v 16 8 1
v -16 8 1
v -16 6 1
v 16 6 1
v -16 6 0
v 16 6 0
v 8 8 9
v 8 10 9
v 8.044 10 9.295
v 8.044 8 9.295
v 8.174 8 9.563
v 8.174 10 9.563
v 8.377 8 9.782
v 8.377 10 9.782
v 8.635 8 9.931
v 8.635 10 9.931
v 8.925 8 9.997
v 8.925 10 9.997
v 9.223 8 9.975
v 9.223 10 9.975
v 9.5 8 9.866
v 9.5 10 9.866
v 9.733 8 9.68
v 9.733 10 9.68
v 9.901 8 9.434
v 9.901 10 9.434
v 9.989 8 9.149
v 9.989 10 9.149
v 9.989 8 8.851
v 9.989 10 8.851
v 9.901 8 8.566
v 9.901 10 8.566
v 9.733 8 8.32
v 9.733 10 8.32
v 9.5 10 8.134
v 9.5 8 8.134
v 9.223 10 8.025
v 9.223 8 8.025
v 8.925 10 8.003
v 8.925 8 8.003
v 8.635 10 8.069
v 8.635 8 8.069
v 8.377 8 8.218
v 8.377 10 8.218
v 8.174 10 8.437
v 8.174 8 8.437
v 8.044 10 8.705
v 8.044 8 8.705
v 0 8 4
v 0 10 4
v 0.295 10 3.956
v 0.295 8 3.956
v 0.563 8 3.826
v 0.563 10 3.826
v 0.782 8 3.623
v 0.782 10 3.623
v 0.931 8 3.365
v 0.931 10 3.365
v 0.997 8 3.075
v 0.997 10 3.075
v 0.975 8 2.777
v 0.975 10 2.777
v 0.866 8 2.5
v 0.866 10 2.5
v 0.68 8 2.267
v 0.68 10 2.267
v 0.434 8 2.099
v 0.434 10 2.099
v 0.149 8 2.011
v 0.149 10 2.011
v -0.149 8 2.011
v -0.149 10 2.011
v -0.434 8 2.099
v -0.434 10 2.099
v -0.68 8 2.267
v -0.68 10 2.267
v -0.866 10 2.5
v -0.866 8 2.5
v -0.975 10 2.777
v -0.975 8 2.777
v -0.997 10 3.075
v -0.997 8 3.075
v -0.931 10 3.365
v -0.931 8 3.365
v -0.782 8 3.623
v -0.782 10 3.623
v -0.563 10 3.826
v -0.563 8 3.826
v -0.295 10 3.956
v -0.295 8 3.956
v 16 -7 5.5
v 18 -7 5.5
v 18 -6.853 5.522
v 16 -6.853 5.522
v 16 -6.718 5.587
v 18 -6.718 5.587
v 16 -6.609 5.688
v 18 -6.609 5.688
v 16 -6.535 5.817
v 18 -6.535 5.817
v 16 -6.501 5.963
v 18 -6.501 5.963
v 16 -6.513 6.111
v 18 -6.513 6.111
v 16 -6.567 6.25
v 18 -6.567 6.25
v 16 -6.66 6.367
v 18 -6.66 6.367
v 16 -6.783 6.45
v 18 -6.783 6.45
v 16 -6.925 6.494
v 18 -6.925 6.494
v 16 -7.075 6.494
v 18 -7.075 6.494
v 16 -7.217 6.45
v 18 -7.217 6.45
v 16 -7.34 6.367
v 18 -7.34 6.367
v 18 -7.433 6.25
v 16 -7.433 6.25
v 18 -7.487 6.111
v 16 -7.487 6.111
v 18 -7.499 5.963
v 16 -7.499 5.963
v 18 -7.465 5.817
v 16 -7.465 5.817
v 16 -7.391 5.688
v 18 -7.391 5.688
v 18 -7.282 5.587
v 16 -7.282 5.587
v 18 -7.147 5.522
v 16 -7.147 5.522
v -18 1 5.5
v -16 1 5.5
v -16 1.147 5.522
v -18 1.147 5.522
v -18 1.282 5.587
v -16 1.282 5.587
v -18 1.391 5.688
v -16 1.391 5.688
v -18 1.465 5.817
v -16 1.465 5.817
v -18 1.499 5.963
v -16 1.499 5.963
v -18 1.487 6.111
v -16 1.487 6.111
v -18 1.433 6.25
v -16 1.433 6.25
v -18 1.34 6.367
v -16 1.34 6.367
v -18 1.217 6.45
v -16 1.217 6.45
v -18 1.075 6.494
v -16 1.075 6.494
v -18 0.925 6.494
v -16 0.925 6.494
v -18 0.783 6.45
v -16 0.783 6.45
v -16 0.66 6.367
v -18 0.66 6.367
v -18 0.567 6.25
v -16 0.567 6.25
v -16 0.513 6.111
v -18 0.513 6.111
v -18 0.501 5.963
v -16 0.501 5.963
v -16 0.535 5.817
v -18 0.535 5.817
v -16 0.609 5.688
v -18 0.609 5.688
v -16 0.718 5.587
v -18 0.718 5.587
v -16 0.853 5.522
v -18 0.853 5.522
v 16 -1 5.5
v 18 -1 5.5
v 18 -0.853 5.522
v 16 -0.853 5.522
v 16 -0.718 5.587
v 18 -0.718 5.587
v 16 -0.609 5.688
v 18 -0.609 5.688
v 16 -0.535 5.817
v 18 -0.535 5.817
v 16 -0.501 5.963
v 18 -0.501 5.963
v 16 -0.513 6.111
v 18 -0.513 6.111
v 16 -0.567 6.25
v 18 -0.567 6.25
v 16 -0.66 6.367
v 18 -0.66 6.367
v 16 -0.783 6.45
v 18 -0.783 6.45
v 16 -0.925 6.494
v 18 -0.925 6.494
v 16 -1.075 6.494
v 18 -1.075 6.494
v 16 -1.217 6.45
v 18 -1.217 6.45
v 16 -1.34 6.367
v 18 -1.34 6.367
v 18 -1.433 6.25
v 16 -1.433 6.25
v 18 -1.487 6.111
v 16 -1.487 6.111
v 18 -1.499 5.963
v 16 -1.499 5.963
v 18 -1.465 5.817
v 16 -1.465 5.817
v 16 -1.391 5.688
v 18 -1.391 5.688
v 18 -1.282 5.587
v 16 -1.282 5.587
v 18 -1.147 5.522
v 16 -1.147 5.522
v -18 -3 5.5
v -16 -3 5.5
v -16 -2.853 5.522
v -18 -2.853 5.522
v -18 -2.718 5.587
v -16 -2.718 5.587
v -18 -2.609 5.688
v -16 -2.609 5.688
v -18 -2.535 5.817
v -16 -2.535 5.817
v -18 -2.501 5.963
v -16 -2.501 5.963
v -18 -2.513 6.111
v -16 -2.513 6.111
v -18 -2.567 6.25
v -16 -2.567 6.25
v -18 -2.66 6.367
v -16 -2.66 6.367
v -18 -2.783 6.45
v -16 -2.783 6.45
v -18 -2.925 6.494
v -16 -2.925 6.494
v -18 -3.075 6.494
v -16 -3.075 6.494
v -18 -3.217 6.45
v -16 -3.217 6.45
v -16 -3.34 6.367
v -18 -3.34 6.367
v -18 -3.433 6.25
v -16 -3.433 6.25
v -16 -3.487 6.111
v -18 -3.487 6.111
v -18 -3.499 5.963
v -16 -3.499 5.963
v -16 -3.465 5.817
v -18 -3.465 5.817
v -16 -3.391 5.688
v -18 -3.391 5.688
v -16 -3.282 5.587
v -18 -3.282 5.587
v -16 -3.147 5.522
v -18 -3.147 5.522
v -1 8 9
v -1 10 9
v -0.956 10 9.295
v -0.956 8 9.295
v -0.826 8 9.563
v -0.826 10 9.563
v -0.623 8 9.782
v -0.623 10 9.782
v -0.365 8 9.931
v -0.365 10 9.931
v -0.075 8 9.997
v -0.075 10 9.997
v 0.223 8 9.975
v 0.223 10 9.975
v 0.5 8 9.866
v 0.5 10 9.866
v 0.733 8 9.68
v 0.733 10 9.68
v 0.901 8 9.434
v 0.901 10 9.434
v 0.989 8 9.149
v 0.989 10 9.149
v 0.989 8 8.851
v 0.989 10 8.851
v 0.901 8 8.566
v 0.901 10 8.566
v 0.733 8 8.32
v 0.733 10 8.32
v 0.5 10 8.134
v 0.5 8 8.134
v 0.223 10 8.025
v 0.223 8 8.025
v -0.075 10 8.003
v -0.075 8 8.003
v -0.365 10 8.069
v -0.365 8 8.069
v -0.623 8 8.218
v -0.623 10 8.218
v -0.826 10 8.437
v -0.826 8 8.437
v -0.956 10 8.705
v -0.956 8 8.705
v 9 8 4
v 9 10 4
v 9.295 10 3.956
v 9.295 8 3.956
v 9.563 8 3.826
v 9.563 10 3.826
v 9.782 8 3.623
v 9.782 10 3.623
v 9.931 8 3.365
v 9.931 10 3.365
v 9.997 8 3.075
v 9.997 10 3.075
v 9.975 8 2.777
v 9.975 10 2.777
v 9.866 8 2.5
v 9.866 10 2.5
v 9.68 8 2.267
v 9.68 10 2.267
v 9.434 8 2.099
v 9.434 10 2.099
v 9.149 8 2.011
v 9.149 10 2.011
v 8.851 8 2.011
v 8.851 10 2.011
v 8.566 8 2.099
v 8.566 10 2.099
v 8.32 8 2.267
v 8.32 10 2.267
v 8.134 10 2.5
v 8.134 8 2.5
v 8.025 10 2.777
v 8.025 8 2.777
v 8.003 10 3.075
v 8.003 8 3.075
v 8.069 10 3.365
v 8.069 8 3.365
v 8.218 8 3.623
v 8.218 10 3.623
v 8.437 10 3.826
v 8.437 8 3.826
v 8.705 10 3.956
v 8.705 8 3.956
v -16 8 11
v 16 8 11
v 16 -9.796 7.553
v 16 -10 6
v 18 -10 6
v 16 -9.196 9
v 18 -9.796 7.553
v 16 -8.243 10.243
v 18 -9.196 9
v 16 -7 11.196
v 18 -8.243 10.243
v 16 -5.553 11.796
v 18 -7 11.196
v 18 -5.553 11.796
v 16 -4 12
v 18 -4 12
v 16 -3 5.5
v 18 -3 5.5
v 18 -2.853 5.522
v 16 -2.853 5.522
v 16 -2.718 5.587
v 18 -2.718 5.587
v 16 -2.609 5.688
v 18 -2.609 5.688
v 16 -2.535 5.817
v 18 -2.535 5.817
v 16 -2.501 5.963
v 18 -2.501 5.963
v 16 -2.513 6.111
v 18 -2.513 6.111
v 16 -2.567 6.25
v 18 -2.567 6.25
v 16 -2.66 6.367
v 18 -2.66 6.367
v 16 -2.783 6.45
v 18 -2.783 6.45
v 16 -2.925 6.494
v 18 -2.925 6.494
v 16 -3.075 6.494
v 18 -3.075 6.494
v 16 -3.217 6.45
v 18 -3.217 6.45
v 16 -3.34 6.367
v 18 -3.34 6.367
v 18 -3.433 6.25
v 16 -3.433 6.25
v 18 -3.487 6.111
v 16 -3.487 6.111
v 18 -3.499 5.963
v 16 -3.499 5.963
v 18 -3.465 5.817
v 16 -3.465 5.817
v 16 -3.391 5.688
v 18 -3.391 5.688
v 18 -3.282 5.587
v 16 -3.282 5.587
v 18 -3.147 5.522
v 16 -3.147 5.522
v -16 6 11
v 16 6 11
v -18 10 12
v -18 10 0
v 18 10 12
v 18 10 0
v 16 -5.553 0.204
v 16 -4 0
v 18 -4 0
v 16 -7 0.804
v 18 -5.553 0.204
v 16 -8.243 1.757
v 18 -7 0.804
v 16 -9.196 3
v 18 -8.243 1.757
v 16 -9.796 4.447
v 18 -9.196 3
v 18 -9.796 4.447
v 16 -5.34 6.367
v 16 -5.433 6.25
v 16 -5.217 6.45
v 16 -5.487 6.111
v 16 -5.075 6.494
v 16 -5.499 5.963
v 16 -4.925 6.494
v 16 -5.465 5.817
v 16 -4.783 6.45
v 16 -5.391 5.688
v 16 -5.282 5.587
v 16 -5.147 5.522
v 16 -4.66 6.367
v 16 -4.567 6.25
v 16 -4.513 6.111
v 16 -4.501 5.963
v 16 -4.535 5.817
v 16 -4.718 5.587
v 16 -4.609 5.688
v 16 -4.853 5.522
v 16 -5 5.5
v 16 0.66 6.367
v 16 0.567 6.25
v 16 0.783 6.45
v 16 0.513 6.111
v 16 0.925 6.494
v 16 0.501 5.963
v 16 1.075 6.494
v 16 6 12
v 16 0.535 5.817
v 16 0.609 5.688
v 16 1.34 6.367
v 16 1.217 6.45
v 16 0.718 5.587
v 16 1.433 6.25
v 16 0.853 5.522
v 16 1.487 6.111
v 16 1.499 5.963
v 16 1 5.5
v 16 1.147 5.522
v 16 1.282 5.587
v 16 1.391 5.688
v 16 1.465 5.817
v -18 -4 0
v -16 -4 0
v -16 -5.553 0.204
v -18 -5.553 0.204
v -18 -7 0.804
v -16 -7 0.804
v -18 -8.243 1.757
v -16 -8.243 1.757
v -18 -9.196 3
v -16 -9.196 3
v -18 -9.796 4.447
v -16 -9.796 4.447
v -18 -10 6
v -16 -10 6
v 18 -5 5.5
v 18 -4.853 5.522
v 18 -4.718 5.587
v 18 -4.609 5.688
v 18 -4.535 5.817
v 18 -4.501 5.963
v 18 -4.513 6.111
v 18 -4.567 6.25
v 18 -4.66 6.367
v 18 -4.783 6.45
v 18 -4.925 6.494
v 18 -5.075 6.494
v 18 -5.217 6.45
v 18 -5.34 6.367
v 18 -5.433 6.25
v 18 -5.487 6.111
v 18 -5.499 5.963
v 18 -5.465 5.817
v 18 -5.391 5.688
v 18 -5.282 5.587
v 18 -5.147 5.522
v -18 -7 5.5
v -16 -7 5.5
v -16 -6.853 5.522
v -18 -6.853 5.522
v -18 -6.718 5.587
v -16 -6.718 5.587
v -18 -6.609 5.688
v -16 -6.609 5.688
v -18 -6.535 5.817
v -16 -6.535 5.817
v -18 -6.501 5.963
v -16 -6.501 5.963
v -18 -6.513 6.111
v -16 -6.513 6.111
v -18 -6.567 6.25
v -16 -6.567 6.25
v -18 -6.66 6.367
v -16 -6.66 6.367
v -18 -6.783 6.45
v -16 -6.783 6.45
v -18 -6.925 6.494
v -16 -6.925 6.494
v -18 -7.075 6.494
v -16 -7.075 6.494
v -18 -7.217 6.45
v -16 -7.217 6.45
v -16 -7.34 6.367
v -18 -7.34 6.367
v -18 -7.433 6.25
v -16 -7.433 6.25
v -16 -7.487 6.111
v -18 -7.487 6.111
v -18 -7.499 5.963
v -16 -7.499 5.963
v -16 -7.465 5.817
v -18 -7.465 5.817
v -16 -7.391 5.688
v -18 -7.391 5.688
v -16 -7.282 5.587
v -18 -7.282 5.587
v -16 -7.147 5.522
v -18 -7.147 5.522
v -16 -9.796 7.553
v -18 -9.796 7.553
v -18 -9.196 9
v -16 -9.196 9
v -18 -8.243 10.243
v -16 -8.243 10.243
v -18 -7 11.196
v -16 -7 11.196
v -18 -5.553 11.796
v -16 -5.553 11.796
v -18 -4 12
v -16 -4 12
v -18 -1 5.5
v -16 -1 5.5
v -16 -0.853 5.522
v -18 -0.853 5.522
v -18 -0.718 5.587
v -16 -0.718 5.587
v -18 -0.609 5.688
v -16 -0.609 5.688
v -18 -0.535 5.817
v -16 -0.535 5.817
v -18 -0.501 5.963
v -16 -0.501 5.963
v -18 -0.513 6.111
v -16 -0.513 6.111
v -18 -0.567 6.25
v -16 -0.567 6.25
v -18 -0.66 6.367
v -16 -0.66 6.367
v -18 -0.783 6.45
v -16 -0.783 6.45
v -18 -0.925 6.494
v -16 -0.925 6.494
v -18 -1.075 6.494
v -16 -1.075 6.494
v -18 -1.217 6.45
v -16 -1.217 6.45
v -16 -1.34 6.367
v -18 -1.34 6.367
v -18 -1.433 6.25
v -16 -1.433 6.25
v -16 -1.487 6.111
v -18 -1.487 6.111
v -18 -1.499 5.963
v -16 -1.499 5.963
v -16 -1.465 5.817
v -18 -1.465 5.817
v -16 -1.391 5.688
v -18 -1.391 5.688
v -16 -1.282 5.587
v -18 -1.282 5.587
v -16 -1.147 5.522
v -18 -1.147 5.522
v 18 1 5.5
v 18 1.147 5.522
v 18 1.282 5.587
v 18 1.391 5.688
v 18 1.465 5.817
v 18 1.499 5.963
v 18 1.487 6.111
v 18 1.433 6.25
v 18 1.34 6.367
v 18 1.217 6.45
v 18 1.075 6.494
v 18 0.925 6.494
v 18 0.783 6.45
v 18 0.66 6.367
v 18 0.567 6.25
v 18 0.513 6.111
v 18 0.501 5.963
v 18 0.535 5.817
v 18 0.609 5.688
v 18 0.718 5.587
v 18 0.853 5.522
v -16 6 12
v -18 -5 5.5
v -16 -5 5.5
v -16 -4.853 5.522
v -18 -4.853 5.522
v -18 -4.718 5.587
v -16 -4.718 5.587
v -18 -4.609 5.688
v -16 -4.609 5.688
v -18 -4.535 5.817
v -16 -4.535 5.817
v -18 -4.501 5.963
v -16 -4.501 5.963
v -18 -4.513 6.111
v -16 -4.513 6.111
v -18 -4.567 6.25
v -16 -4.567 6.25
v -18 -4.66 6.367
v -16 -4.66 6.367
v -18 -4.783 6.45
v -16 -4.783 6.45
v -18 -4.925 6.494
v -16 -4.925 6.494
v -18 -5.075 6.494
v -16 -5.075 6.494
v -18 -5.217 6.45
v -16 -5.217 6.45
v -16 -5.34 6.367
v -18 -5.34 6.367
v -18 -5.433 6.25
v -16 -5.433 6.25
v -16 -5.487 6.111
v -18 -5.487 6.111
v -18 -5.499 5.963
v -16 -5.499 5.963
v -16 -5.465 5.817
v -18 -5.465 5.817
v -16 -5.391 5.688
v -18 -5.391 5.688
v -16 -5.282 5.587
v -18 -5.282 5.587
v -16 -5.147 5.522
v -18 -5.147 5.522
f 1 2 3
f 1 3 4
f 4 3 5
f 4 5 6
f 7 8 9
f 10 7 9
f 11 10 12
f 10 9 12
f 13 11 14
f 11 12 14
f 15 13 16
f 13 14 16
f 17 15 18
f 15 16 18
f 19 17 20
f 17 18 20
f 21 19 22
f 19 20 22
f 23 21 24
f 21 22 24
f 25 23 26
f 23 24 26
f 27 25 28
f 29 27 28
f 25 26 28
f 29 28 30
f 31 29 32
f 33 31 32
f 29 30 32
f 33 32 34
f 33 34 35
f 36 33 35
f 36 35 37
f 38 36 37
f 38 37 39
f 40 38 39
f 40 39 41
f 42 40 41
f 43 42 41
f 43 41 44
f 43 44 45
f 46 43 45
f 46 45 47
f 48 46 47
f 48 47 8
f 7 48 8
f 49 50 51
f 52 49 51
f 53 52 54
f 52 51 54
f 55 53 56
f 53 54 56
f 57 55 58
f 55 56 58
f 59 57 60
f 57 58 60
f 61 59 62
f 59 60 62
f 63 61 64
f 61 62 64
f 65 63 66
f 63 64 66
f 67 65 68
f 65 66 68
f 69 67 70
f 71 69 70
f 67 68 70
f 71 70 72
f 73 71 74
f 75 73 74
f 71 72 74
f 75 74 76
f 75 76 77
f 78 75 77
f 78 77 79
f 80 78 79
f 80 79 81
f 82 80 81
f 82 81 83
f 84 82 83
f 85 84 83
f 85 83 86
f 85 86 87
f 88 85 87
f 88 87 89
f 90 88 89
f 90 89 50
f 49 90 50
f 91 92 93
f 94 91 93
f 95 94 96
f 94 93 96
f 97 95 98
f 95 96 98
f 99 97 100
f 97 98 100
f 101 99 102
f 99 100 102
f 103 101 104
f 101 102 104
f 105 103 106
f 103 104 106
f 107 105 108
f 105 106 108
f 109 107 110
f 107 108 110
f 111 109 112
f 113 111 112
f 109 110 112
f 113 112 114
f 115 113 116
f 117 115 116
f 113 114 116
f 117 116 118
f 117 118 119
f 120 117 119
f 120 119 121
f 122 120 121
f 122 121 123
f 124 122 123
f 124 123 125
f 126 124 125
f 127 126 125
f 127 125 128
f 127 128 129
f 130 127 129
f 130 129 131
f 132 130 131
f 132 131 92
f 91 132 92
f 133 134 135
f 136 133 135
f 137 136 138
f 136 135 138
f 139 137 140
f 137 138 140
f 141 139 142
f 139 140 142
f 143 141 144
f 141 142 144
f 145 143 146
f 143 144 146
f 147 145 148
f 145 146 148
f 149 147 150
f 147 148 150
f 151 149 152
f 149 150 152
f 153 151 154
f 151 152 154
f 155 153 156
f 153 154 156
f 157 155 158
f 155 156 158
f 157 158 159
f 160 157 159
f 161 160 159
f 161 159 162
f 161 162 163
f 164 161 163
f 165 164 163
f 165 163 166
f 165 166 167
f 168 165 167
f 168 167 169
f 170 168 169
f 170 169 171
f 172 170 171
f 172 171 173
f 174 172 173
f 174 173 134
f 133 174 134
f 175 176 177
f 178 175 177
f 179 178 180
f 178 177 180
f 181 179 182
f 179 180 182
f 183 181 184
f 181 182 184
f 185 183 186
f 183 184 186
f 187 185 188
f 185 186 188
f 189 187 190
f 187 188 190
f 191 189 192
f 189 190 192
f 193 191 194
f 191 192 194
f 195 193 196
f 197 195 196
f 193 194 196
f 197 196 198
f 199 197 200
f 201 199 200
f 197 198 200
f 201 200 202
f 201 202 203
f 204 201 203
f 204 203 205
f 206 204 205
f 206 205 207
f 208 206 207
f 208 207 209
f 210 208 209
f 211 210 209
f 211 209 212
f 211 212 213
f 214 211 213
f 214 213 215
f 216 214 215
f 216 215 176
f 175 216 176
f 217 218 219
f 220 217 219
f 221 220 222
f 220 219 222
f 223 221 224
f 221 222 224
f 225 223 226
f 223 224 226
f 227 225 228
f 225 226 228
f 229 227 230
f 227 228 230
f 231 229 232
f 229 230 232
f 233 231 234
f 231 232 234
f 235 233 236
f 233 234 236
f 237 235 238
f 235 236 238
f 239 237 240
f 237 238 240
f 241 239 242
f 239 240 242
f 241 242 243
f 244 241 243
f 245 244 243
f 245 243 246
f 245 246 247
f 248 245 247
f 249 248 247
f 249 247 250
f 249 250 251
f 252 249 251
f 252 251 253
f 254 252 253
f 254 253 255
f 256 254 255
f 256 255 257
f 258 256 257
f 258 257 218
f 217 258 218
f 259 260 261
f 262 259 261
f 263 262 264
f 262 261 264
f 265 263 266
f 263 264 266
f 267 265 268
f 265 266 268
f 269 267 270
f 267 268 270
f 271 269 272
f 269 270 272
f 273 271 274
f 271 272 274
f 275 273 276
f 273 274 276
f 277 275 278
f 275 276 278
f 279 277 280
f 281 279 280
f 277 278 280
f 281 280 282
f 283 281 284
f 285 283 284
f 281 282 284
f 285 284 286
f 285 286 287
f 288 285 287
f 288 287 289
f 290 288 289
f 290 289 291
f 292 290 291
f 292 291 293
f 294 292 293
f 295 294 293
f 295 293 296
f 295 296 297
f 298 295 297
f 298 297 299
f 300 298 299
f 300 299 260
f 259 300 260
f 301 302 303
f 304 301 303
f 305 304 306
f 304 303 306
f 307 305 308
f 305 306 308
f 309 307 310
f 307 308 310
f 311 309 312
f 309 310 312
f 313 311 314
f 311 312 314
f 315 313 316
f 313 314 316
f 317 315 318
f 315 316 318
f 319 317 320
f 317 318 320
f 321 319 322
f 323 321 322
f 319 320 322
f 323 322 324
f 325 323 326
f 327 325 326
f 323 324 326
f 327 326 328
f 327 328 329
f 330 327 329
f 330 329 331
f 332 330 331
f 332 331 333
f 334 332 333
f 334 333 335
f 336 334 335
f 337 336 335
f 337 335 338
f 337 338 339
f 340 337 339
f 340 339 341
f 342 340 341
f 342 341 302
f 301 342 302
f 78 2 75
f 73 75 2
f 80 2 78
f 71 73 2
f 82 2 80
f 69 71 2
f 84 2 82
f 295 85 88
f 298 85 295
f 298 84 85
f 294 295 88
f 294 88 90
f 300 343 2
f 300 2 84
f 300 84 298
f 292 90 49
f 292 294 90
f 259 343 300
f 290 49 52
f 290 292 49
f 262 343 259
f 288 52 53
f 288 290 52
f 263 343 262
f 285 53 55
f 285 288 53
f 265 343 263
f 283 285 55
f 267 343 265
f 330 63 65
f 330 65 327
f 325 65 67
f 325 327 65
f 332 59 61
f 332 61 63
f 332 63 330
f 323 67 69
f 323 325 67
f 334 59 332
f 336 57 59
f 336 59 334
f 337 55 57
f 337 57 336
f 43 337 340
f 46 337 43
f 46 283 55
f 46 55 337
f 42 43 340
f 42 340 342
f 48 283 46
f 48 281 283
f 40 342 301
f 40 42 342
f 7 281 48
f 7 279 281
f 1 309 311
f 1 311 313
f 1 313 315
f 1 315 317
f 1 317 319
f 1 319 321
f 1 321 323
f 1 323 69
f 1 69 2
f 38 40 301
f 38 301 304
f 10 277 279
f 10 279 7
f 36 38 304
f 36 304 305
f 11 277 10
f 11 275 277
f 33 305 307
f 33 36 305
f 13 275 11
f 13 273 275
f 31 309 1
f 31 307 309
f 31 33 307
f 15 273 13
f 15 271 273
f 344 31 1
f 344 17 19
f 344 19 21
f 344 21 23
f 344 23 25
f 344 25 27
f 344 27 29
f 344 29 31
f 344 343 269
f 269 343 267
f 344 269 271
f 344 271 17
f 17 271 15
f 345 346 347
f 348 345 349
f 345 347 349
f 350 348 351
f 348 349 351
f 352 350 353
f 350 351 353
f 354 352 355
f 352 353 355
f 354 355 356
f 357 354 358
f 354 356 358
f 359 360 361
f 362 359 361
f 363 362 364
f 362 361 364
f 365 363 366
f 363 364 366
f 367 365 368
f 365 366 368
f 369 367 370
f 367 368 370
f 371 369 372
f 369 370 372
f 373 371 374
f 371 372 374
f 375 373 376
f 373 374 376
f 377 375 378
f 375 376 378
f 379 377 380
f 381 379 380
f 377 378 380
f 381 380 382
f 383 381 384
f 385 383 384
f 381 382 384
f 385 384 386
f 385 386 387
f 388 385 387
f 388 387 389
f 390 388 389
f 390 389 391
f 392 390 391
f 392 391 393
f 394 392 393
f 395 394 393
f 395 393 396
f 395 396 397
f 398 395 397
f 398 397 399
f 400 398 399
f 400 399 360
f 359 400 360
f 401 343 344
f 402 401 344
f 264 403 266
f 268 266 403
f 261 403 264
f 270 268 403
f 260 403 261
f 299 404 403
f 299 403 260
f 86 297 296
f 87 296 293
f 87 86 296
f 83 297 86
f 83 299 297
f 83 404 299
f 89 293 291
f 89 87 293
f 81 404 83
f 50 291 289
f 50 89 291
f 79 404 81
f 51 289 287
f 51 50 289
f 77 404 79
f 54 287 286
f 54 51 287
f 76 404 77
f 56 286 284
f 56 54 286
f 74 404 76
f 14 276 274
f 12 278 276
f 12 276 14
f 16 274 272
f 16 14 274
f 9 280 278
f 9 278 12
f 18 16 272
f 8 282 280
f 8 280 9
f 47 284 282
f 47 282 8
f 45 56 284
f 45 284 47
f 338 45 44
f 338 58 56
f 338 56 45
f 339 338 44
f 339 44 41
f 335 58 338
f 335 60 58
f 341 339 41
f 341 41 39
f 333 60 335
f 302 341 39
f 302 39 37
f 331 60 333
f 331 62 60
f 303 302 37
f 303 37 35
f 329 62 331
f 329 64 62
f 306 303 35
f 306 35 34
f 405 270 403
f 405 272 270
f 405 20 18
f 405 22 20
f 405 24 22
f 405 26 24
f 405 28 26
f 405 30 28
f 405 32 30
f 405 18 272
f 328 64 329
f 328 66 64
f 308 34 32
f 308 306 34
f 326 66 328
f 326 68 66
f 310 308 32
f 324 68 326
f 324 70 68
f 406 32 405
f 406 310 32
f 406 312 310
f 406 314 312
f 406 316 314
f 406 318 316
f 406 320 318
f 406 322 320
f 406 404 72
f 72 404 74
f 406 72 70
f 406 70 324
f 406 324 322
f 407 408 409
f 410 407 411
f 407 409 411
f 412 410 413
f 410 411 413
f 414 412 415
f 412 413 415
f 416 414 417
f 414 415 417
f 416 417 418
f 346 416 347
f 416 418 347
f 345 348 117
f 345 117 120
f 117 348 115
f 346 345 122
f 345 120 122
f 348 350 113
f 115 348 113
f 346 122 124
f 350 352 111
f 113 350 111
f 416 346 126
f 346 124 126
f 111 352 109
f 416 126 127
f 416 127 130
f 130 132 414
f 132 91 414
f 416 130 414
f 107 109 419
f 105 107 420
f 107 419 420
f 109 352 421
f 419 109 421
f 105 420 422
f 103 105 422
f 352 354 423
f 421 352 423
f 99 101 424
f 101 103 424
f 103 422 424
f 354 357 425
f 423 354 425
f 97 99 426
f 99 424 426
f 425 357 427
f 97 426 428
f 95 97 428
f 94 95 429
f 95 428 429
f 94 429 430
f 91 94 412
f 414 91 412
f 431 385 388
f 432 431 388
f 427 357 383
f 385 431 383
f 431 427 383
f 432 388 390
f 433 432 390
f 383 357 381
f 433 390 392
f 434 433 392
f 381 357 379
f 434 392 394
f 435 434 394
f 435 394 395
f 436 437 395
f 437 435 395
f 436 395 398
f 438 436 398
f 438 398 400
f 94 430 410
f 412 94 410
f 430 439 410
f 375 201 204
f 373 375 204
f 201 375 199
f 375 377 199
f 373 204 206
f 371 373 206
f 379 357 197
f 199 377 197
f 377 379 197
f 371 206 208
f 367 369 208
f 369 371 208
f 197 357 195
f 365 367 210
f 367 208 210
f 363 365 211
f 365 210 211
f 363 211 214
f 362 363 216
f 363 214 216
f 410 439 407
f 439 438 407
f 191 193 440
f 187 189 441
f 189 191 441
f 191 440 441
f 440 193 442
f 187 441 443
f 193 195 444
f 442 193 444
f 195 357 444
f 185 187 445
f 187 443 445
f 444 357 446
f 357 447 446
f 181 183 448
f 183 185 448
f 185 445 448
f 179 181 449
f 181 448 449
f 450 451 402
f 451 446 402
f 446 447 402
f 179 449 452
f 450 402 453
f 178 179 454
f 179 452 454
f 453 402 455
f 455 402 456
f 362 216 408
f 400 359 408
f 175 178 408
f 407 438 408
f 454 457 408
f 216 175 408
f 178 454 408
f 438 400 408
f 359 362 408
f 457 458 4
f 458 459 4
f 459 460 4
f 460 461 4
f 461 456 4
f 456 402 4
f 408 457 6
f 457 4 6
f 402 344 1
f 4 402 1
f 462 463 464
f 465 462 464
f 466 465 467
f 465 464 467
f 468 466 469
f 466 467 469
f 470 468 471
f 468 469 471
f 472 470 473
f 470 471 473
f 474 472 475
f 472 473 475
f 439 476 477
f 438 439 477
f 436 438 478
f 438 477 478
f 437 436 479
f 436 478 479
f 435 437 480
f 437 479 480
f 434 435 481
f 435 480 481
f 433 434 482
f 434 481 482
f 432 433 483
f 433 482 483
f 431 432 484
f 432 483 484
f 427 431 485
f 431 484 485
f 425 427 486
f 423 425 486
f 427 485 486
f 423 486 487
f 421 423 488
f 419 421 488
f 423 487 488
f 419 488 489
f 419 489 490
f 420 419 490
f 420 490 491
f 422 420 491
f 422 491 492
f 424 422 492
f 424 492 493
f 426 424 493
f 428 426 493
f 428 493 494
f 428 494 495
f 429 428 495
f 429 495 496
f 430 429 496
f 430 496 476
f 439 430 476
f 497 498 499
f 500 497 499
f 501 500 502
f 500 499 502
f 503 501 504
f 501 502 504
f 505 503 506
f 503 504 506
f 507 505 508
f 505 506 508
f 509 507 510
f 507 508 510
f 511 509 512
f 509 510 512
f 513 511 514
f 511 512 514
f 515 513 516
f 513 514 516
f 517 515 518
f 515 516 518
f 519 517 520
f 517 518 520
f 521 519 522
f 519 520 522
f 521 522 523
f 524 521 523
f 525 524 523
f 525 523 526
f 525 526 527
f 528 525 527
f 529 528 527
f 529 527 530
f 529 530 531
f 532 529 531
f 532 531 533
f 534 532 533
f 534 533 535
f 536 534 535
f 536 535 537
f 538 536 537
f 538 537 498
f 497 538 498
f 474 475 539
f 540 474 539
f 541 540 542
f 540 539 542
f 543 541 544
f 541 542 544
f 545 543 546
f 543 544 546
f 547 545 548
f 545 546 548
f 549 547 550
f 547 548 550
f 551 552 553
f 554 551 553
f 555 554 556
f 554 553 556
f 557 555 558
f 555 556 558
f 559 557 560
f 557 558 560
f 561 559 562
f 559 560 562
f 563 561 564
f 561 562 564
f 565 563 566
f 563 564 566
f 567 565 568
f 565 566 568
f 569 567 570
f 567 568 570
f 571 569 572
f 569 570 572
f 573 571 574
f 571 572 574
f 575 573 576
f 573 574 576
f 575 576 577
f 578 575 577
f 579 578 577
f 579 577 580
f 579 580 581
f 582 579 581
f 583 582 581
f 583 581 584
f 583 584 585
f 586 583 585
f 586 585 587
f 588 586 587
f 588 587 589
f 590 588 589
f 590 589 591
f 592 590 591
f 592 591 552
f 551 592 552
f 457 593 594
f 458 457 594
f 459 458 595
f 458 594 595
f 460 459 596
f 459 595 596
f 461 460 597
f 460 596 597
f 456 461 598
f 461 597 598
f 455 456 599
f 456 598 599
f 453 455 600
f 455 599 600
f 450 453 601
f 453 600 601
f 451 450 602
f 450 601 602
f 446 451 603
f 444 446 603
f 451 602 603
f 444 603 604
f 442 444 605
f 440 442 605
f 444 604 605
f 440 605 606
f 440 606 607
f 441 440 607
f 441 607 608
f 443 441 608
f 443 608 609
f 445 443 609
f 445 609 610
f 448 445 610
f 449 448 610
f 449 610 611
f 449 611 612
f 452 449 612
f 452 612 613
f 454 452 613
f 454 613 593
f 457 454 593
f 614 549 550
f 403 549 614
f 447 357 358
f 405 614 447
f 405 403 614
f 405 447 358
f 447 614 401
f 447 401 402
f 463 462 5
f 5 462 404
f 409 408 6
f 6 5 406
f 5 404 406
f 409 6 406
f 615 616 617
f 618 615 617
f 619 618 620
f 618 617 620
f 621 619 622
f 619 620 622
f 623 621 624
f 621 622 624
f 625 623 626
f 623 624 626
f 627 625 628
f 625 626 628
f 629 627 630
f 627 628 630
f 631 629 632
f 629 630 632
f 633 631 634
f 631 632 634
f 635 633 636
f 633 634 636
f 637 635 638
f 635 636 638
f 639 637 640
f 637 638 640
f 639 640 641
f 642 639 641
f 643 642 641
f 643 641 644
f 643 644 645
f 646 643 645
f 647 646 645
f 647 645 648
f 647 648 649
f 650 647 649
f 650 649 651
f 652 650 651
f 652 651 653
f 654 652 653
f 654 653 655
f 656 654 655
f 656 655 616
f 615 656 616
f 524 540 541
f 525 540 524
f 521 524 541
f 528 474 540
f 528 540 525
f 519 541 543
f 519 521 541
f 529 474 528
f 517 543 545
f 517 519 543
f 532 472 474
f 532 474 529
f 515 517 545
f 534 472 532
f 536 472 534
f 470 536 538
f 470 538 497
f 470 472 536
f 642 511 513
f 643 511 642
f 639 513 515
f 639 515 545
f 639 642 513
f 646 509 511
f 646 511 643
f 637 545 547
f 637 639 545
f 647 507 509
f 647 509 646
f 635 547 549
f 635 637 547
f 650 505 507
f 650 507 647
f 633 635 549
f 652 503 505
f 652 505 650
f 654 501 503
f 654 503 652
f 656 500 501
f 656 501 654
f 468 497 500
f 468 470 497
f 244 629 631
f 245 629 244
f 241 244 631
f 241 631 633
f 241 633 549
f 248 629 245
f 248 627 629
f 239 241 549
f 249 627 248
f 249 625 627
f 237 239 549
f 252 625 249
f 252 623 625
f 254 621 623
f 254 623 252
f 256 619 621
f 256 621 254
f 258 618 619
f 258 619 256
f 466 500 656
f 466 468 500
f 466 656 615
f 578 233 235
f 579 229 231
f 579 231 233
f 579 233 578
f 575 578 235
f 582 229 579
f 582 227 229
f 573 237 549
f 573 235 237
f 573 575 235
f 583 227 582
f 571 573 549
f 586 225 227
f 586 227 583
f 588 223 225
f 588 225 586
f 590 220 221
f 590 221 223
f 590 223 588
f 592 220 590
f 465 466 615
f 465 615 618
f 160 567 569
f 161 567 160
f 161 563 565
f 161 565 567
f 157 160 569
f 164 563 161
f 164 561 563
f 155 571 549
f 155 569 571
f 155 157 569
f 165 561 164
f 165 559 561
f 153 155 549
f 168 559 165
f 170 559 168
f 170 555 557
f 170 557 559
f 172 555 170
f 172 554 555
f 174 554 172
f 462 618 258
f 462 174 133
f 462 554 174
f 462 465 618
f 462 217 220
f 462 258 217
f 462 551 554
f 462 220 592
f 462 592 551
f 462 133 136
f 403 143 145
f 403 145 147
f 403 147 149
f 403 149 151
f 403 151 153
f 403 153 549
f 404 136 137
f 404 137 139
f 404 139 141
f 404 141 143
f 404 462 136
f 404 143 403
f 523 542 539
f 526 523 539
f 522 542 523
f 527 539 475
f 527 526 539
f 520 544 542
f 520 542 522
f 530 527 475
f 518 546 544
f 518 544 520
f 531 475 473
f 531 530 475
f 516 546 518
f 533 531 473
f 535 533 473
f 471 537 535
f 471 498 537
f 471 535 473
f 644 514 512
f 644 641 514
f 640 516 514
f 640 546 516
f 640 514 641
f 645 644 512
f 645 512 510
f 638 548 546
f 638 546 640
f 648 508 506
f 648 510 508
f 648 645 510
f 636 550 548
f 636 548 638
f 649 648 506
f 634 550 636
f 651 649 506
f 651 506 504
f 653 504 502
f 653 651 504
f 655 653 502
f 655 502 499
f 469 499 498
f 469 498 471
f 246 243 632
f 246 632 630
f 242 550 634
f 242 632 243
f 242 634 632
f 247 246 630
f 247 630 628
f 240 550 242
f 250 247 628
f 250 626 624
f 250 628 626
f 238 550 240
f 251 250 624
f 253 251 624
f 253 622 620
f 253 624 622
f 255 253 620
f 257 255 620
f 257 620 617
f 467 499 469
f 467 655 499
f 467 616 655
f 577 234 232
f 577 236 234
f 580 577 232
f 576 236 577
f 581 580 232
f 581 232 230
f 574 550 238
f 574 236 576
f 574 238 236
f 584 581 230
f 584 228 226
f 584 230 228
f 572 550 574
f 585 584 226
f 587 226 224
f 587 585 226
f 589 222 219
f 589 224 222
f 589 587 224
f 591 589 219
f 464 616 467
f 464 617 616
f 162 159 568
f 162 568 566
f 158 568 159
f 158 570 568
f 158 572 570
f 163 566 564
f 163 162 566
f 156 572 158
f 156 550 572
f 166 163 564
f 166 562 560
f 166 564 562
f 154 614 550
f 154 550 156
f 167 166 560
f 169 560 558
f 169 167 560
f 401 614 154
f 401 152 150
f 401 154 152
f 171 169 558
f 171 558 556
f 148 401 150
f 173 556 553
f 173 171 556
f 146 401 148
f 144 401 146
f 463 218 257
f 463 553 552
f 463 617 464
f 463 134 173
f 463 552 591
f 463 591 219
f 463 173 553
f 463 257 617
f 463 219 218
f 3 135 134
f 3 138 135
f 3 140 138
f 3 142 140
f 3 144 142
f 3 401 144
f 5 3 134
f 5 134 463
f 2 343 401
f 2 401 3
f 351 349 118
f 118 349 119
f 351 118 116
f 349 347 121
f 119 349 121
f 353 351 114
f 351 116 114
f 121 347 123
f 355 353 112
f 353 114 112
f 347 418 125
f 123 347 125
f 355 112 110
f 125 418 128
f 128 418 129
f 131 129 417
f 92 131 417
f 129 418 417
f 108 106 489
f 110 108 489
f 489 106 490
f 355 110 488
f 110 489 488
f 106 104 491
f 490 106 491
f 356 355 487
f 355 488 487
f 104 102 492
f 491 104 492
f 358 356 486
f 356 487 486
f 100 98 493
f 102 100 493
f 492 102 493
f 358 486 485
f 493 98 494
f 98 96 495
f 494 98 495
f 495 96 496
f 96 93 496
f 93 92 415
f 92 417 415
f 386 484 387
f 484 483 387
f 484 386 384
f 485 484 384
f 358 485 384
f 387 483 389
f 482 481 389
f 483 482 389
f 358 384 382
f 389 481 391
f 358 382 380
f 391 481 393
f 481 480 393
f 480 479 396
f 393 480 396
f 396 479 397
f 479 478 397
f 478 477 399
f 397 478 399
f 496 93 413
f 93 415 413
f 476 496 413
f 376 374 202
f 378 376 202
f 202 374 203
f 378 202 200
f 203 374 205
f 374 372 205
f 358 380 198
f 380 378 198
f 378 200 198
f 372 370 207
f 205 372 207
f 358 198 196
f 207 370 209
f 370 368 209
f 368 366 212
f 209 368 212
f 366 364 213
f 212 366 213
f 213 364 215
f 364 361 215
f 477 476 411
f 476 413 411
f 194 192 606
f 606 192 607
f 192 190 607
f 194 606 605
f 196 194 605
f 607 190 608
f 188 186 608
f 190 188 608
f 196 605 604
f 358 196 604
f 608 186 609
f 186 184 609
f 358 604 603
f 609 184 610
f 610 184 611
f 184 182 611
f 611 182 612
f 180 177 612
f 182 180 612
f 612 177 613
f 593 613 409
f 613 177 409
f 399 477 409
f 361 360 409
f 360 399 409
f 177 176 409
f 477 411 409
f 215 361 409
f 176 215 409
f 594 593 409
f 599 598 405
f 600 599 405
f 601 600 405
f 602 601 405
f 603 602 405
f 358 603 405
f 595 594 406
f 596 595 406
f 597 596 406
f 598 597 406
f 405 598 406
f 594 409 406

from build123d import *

# Parameters (mm, degrees)
SKETCH1_W           = 36
SKETCH1_H           = 20
BOSS_EXTRUDE1_DEPTH = 12
SKETCH3_W           = 32
SKETCH3_H           = 16
CUT_EXTRUDE1_DEPTH  = 12
SKETCH4_W           = 32
SKETCH4_H           = 12
CUT_EXTRUDE2_DEPTH  = 12
CUT_EXTRUDE3_DEPTH  = 40.242833741
SKETCH5_R           = 1
CUT_EXTRUDE4_DEPTH  = 10
SKETCH6_R           = 0.5
CUT_EXTRUDE5_DEPTH  = 40.242833741
SKETCH7_W           = 32
SKETCH7_H           = 1
BOSS_EXTRUDE2_DEPTH = 2


with BuildPart() as part:
    # Sketch1 → Boss-Extrude1 (new body)
    with BuildSketch(Plane.XY):
        Rectangle(SKETCH1_W, SKETCH1_H)
    extrude(amount=BOSS_EXTRUDE1_DEPTH)

    # Sketch3 → Cut-Extrude1 (cut)
    with BuildSketch(Plane.XY.offset(12)):
        Rectangle(SKETCH3_W, SKETCH3_H)
    extrude(amount=-CUT_EXTRUDE1_DEPTH, mode=Mode.SUBTRACT)

    # Sketch4 → Cut-Extrude2 (cut)
    with BuildSketch(Plane(origin=(0, -8, 0), x_dir=(1, 0, 0), z_dir=(0, 1, 0))):
        with Locations((0, -6)):
            Rectangle(SKETCH4_W, SKETCH4_H)
    extrude(amount=-CUT_EXTRUDE2_DEPTH, mode=Mode.SUBTRACT)

    # Sketch2 → Cut-Extrude3 (cut, through all)
    with BuildSketch(Plane(origin=(18, 0, 0), x_dir=(0, 0, -1), z_dir=(1, 0, 0))):
        with BuildLine():
            Line((-12, -10), (-6, -10))
            ThreePointArc((-6, -10), (-10.242640687, -8.242640687), (-12, -4))
            Line((-12, -4), (-12, -10))
        make_face()
        with BuildLine():
            Line((-6, -10), (0, -10))
            Line((0, -10), (0, -4))
            ThreePointArc((0, -4), (-1.757359313, -8.242640687), (-6, -10))
        make_face()
    extrude(amount=-CUT_EXTRUDE3_DEPTH, mode=Mode.SUBTRACT)

    # Sketch5 → Cut-Extrude4 (cut)
    with BuildSketch(Plane(origin=(0, 10, 0), x_dir=(1, 0, 0), z_dir=(0, 1, 0))):
        with Locations(Location((9, -3, 0), (0, 0, 270))):
            Circle(SKETCH5_R)
        with Locations(Location((9, -9, 0), (0, 0, 180))):
            Circle(SKETCH5_R)
        with Locations(Location((0, -9, 0), (0, 0, 180))):
            Circle(SKETCH5_R)
        with Locations(Location((0, -3, 0), (0, 0, 270))):
            Circle(SKETCH5_R)
    extrude(amount=-CUT_EXTRUDE4_DEPTH, mode=Mode.SUBTRACT)

    # Sketch6 → Cut-Extrude5 (cut, through all)
    with BuildSketch(Plane(origin=(18, 0, 0), x_dir=(0, 0, -1), z_dir=(1, 0, 0))):
        with Locations((-6, -7)):
            Circle(SKETCH6_R)
        with Locations((-6, -5)):
            Circle(SKETCH6_R)
        with Locations((-6, -3)):
            Circle(SKETCH6_R)
        with Locations((-6, -1)):
            Circle(SKETCH6_R)
        with Locations((-6, 1)):
            Circle(SKETCH6_R)
    extrude(amount=-CUT_EXTRUDE5_DEPTH, mode=Mode.SUBTRACT)

    # Sketch7 → Boss-Extrude2 (add)
    with BuildSketch(Plane.XZ.offset(-8)):
        with Locations((0, 11.5)):
            Rectangle(SKETCH7_W, SKETCH7_H)
        with Locations((0, 0.5)):
            Rectangle(SKETCH7_W, SKETCH7_H)
    extrude(amount=BOSS_EXTRUDE2_DEPTH)


solid = part.part
